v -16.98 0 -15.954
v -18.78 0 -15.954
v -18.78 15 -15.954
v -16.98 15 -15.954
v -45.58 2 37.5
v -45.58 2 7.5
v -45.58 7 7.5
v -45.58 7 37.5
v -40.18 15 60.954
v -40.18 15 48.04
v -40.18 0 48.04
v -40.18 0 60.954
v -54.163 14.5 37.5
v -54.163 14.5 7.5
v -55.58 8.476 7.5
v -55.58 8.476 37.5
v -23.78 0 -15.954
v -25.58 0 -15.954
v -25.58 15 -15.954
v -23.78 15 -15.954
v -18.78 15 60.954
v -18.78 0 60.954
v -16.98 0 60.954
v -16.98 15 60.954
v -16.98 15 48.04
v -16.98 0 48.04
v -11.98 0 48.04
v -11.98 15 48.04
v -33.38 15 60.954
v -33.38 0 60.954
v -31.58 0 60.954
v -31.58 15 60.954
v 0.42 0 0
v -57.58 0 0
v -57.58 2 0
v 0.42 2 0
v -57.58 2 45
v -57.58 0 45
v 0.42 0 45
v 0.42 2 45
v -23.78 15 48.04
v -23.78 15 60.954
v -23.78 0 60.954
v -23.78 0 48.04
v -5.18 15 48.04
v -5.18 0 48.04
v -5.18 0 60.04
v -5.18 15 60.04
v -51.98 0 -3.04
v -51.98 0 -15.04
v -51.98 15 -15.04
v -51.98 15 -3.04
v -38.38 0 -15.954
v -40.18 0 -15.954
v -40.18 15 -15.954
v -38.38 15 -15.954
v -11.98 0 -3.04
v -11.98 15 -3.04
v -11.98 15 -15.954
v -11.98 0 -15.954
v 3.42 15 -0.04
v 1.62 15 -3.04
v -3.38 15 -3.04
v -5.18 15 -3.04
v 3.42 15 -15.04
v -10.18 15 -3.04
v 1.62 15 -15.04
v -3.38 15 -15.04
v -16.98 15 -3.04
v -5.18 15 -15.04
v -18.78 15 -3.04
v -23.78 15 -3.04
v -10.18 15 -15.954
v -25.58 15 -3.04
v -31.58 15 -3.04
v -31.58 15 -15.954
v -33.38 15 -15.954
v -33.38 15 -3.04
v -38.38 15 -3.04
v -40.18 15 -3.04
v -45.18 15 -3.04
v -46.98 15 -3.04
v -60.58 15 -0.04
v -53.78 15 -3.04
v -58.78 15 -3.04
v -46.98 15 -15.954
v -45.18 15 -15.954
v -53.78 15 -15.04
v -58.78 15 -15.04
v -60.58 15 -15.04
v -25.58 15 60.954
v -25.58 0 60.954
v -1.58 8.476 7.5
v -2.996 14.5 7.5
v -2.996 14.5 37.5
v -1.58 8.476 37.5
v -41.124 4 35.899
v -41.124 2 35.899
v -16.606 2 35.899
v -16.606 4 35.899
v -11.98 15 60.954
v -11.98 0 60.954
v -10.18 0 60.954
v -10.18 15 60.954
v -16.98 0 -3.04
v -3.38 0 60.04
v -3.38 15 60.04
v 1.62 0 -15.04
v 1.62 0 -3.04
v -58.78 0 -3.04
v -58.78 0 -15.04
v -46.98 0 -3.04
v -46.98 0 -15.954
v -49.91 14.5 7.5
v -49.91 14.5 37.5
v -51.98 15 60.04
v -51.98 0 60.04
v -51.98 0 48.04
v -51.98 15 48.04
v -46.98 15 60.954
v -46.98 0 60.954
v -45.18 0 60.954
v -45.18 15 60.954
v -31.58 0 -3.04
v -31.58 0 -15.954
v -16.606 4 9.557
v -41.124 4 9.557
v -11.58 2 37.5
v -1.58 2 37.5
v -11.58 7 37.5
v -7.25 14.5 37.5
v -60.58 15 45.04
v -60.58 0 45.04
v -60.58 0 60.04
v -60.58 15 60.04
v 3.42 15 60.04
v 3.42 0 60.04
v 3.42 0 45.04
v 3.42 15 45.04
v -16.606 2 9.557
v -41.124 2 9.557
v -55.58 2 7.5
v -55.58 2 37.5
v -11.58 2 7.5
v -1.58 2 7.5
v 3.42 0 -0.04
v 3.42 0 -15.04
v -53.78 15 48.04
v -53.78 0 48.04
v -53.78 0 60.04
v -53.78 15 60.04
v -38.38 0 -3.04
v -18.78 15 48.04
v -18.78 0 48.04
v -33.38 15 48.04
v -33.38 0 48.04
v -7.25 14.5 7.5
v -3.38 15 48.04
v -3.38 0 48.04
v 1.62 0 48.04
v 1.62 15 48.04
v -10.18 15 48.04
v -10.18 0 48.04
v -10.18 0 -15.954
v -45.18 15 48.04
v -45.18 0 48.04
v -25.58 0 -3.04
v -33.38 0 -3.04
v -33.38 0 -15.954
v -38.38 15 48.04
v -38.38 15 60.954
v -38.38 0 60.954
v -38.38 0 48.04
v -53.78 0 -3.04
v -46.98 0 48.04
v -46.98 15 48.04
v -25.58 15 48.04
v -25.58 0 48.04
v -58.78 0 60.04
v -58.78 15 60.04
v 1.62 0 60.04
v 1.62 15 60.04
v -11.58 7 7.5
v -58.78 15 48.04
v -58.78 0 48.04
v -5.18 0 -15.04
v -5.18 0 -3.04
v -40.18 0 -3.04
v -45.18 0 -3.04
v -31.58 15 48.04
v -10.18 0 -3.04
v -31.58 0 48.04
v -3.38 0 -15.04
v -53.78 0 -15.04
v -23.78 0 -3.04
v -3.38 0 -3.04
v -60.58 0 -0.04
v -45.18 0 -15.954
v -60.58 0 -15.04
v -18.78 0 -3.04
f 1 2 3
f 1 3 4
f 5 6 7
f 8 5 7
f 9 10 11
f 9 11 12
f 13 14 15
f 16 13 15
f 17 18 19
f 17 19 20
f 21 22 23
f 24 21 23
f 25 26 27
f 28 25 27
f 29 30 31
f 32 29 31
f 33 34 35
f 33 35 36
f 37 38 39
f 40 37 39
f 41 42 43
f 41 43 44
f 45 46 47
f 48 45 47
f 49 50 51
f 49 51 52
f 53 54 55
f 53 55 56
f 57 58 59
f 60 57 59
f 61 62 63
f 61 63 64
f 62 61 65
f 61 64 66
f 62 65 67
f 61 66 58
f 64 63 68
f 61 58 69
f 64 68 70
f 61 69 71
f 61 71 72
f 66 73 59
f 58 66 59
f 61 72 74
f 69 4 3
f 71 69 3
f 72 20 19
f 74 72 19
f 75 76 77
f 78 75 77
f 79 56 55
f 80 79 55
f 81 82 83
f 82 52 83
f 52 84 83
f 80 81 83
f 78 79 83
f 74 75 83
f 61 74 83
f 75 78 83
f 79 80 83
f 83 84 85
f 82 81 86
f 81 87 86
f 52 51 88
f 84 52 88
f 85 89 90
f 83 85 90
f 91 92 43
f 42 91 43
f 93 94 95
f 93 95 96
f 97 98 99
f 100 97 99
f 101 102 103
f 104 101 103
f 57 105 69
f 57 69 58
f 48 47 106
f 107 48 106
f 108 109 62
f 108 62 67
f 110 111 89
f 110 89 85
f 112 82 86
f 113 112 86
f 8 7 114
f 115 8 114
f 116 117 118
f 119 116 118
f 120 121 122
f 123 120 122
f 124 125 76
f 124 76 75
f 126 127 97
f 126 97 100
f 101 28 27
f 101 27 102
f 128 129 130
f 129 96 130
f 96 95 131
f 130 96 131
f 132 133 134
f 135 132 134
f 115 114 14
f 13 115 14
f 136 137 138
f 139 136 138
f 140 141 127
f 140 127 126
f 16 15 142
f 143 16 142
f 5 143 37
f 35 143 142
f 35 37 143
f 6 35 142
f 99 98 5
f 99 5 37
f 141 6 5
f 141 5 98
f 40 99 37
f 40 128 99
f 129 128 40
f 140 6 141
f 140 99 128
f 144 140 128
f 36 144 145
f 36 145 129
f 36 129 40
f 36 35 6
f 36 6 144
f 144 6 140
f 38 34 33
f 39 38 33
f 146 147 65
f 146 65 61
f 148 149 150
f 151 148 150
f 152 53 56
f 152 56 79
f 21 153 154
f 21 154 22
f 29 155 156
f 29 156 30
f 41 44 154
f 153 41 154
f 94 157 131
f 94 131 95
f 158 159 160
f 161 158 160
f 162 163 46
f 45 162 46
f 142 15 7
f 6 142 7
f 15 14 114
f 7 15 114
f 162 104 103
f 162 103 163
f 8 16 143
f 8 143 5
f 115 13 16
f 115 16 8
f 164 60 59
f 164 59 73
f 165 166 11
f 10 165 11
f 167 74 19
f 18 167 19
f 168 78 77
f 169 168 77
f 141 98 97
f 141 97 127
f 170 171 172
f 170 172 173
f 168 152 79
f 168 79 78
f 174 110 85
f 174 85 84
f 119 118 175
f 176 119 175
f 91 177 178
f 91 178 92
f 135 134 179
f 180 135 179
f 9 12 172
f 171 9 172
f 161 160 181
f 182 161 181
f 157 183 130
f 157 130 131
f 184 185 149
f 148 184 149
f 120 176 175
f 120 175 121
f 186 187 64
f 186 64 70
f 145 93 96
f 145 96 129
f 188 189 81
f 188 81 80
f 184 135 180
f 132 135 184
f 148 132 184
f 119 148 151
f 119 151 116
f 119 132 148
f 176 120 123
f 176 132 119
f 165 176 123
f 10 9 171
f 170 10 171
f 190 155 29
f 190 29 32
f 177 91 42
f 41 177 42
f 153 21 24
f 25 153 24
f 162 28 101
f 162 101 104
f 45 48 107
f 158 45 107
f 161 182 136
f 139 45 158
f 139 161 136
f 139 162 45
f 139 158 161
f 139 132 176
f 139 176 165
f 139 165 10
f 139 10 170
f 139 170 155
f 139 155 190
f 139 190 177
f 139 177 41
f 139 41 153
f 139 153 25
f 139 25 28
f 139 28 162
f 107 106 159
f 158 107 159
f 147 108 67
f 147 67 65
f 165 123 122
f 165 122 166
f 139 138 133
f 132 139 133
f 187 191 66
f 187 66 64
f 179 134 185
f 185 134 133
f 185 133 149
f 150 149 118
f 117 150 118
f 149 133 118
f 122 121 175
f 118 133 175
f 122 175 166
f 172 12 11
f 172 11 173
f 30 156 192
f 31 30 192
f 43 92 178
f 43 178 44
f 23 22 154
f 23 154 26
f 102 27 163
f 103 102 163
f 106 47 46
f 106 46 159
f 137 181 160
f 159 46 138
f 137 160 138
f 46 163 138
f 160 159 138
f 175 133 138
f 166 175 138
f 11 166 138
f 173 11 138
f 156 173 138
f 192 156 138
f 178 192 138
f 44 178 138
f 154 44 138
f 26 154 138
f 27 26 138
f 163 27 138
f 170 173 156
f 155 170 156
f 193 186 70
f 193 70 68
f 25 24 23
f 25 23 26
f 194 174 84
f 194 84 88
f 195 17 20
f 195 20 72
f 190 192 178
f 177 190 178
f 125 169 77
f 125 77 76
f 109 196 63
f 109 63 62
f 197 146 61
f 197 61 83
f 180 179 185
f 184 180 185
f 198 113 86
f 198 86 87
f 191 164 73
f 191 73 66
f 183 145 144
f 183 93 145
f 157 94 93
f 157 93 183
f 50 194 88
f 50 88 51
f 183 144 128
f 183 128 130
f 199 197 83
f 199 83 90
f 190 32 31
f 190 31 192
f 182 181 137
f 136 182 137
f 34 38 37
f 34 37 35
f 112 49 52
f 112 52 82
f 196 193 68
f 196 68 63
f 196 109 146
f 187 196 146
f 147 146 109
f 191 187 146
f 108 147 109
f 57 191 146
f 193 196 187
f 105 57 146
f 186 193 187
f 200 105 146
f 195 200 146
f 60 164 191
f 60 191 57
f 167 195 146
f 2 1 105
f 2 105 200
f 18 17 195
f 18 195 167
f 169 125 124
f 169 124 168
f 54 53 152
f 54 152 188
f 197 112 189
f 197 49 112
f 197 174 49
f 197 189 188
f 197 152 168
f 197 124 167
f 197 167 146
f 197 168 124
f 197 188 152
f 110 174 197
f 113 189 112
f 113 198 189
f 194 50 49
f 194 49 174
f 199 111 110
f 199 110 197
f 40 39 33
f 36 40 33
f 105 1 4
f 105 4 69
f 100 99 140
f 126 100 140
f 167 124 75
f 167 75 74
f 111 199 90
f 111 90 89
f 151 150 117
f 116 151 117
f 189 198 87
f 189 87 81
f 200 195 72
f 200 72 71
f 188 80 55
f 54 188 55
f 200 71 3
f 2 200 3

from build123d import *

# Parameters (mm, degrees)
SKETCH2_W             = 58
SKETCH2_H             = 45
BOSS_EXTRUDE1_DEPTH   = 2
BOSS_EXTRUDE2_DEPTH   = 15
BOSS_EXTRUDE2_2_DEPTH = 15
BOSS_EXTRUDE3_DEPTH   = 30
SKETCH5_W             = 24.518025474
SKETCH5_H             = 26.342622719
BOSS_EXTRUDE4_DEPTH   = 2


with BuildPart() as part:
    # Sketch2 → Boss-Extrude1 (new body)
    with BuildSketch(Plane(origin=(0, 0, 0), x_dir=(1, 0, 0), z_dir=(0, 1, 0))):
        with Locations((-28.579660082, -22.5)):
            Rectangle(SKETCH2_W, SKETCH2_H)
    extrude(amount=BOSS_EXTRUDE1_DEPTH)

    # Sketch4 → Boss-Extrude3 (add)
    with BuildSketch(Plane.XY.offset(7.5)):
        Polygon((-1.579660082, 2), (-11.579660082, 2), (-11.579660082, 7), (-7.249533064, 14.5), (-2.99635519, 14.5), (-1.579660082, 8.476286332), align=None)
        Polygon((-55.579660082, 8.476286332), (-55.579660082, 2), (-45.579660082, 2), (-45.579660082, 7), (-49.909787101, 14.5), (-54.162964975, 14.5), align=None)
    extrude(amount=BOSS_EXTRUDE3_DEPTH)

    # Sketch5 → Boss-Extrude4 (add)
    with BuildSketch(Plane(origin=(0, 2, 0), x_dir=(1, 0, 0), z_dir=(0, 1, 0))):
        with Locations((-28.864753402, -22.728074656)):
            Rectangle(SKETCH5_W, SKETCH5_H)
    extrude(amount=BOSS_EXTRUDE4_DEPTH)


with BuildPart() as body_2:
    # Sketch3 → Boss-Extrude2 (new body)
    with BuildSketch(Plane(origin=(0, 0, 0), x_dir=(1, 0, 0), z_dir=(0, 1, 0))):
        Polygon((3.420339918, -45.039874663), (-60.579660082, -45.039874663), (-60.579660082, -60.039874663), (-58.779660082, -60.039874663), (-58.779660082, -48.039874663), (-53.779660082, -48.039874663), (-53.779660082, -60.039874663), (-51.979660082, -60.039874663), (-51.979660082, -48.039874663), (-46.979660082, -48.039874663), (-46.979660082, -60.953661468), (-45.179660082, -60.953661468), (-45.179660082, -48.039874663), (-40.179660082, -48.039874663), (-40.179660082, -60.953661468), (-38.379660082, -60.953661468), (-38.379660082, -48.039874663), (-33.379660082, -48.039874663), (-33.379660082, -60.953661468), (-31.579660082, -60.953661468), (-31.579660082, -48.039874663), (-25.579660082, -48.039874663), (-25.579660082, -60.953661468), (-23.779660082, -60.953661468), (-23.779660082, -48.039874663), (-18.779660082, -48.039874663), (-18.779660082, -60.953661468), (-16.979660082, -60.953661468), (-16.979660082, -48.039874663), (-11.979660082, -48.039874663), (-11.979660082, -60.953661468), (-10.179660082, -60.953661468), (-10.179660082, -48.039874663), (-5.179660082, -48.039874663), (-5.179660082, -60.039874663), (-3.379660082, -60.039874663), (-3.379660082, -48.039874663), (1.620339918, -48.039874663), (1.620339918, -60.039874663), (3.420339918, -60.039874663), align=None)
    extrude(amount=BOSS_EXTRUDE2_DEPTH)


with BuildPart() as body_3:
    # Sketch3 → Boss-Extrude2 2 (new body)
    with BuildSketch(Plane(origin=(0, 0, 0), x_dir=(1, 0, 0), z_dir=(0, 1, 0))):
        Polygon((-60.579660082, 15.039874663), (-58.779660082, 15.039874663), (-58.779660082, 3.039874663), (-53.779660082, 3.039874663), (-53.779660082, 15.039874663), (-51.979660082, 15.039874663), (-51.979660082, 3.039874663), (-46.979660082, 3.039874663), (-46.979660082, 15.953661468), (-45.179660082, 15.953661468), (-45.179660082, 3.039874663), (-40.179660082, 3.039874663), (-40.179660082, 15.953661468), (-38.379660082, 15.953661468), (-38.379660082, 3.039874663), (-33.379660082, 3.039874663), (-33.379660082, 15.953661468), (-31.579660082, 15.953661468), (-31.579660082, 3.039874663), (-25.579660082, 3.039874663), (-25.579660082, 15.953661468), (-23.779660082, 15.953661468), (-23.779660082, 3.039874663), (-18.779660082, 3.039874663), (-18.779660082, 15.953661468), (-16.979660082, 15.953661468), (-16.979660082, 3.039874663), (-11.979660082, 3.039874663), (-11.979660082, 15.953661468), (-10.179660082, 15.953661468), (-10.179660082, 3.039874663), (-5.179660082, 3.039874663), (-5.179660082, 15.039874663), (-3.379660082, 15.039874663), (-3.379660082, 3.039874663), (1.620339918, 3.039874663), (1.620339918, 15.039874663), (3.420339918, 15.039874663), (3.420339918, 0.039874663), (-60.579660082, 0.039874663), align=None)
    extrude(amount=BOSS_EXTRUDE2_2_DEPTH)


solid = Compound([part.part, body_2.part, body_3.part])
